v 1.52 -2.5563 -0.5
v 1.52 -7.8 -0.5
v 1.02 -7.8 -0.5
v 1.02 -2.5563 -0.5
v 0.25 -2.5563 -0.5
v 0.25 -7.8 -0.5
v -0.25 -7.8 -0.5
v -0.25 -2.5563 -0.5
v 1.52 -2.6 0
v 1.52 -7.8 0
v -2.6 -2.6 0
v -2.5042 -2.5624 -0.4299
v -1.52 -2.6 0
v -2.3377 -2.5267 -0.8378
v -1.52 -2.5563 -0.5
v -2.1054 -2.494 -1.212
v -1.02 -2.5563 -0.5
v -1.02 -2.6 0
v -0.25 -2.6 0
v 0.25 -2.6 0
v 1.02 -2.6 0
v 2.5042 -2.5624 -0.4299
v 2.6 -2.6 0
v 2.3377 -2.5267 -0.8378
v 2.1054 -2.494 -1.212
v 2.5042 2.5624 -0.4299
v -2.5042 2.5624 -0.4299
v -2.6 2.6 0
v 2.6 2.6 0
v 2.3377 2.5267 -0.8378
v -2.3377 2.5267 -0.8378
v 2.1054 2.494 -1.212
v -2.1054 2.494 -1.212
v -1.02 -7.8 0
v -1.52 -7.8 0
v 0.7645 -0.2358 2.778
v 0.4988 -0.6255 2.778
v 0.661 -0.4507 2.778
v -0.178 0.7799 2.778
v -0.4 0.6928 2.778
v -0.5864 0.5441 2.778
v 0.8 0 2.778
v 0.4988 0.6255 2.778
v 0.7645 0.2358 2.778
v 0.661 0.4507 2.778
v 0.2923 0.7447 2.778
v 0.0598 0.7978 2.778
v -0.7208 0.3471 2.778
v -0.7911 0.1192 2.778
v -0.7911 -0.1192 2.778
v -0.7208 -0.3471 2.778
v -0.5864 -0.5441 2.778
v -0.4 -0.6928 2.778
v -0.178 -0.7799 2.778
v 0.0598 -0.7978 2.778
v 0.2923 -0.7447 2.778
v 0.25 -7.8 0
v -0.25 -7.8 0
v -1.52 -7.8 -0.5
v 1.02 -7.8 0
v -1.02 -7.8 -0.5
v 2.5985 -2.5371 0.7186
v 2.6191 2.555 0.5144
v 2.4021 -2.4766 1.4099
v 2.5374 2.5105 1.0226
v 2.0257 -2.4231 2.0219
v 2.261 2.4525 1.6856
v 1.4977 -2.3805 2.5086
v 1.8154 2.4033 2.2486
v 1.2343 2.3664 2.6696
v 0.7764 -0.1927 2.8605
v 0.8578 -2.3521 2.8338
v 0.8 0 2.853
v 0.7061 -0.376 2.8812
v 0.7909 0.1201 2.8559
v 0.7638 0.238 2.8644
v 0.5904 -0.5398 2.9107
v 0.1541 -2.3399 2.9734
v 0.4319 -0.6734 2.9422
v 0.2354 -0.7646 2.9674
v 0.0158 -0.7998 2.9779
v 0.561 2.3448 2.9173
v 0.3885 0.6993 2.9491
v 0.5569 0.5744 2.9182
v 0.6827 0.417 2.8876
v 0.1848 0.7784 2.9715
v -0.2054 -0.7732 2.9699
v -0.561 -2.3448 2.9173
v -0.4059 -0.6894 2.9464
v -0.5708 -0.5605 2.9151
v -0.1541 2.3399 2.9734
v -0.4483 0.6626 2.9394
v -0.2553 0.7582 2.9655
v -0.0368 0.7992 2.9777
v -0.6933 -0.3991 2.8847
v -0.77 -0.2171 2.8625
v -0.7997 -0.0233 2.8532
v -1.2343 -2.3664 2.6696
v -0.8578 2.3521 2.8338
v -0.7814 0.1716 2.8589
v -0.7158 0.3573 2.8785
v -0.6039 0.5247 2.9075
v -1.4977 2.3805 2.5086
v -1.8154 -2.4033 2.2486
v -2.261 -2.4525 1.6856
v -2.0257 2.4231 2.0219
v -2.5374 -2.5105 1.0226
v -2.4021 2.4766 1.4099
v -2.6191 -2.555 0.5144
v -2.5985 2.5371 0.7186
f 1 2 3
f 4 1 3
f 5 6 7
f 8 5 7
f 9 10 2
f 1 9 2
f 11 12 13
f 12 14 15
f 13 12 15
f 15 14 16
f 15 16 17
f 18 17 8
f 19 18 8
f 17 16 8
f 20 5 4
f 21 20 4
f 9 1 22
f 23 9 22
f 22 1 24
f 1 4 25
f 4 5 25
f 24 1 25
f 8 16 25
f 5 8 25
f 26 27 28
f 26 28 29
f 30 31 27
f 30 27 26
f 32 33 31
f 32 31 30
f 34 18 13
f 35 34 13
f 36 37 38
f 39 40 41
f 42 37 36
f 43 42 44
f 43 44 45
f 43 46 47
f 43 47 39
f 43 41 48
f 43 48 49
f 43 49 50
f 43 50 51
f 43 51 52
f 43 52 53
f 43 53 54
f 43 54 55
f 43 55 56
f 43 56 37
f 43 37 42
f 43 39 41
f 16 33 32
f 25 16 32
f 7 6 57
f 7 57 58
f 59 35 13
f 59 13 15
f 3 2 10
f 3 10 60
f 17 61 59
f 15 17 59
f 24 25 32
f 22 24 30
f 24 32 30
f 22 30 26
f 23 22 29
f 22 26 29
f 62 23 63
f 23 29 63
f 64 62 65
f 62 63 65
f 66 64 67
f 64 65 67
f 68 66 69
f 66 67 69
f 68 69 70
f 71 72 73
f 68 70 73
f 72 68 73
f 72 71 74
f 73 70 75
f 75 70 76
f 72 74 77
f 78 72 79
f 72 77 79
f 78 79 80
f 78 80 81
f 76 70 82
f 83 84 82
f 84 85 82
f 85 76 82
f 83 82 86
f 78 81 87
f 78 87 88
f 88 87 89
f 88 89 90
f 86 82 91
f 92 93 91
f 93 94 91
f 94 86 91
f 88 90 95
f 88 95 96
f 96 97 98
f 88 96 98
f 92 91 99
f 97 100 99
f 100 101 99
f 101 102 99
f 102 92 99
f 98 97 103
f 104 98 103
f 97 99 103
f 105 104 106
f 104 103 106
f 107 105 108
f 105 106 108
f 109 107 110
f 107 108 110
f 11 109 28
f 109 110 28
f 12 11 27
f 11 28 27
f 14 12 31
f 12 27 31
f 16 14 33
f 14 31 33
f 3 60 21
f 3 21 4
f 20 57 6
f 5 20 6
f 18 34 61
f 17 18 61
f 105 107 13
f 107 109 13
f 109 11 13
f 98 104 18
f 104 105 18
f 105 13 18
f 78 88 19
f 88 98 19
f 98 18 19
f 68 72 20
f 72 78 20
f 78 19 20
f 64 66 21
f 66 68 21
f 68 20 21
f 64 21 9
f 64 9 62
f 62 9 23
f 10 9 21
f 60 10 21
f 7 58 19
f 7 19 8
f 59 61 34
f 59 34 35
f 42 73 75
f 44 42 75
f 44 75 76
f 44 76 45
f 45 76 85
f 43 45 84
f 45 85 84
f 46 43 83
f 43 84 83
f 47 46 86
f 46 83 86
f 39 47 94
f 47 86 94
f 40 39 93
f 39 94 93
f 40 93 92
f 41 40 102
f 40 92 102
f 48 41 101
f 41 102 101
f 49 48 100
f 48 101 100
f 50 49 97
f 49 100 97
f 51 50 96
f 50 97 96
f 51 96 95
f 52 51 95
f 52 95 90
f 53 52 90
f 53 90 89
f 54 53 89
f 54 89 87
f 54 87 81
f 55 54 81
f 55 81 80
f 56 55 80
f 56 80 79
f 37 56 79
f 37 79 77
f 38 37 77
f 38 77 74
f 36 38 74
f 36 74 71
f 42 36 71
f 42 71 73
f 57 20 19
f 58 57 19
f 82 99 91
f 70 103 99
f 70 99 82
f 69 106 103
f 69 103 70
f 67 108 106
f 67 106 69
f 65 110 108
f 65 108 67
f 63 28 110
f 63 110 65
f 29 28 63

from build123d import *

# Parameters (mm, degrees)
BOSS_EXTRUDE1_DEPTH             = 2.6
SKETCH5_W                       = 11.826356456
SKETCH5_H                       = 5.621169426
CUT_EXTRUDE2_DEPTH              = 7.632050589
SKETCH6_W                       = 11.690711404
SKETCH6_H                       = 7.254613366
CUT_EXTRUDE3_DEPTH              = 5.2
SKETCH7_W                       = 0.5
SKETCH7_H                       = 0.5
BOSS_EXTRUDE2_DEPTH             = 12.7
BOSS_EXTRUDE2_DIRECTION_2_REACH = 8.542
SKETCH8_R                       = 0.8
CUT_EXTRUDE4_DEPTH              = 0.2
SKETCH10_W                      = 6.769382977
SKETCH10_H                      = 8.778669798
CUT_EXTRUDE5_DEPTH              = 17.078911904


with BuildPart() as part:
    # Sketch2 → Boss-Extrude1 (new, symmetric)
    with BuildSketch(Plane(origin=(0, 0, 0), x_dir=(1, 0, 0), z_dir=(0, 1, 0))):
        with BuildLine():
            Line((-2.105447518, 1.212026432), (2.105447518, 1.212026432))
            ThreePointArc((2.105447518, 1.212026432), (0, -2.977973568), (-2.105447518, 1.212026432))
        make_face()
    extrude(amount=BOSS_EXTRUDE1_DEPTH, both=True)

    # Sketch5 → Cut-Extrude2 (cut, through all)
    with BuildSketch(Plane(origin=(0, 2.580250079, -0.225742631), x_dir=(1, 0, 0), z_dir=(0, 0.9961946980917455, -0.08715574274765836))):
        with Locations((0.924694538, -0.744658901)):
            Rectangle(SKETCH5_W, SKETCH5_H)
    cut_extrude2 = extrude(amount=CUT_EXTRUDE2_DEPTH, mode=Mode.SUBTRACT)

    # Sketch6 → Cut-Extrude3 (cut)
    with BuildSketch(Plane(origin=(0, 2.580250079, 0.225742631), x_dir=(1, 0, 0), z_dir=(0, 0.9961946980917467, 0.08715574274764504))):
        with Locations((0.257342704, -2.465539164)):
            Rectangle(SKETCH6_W, SKETCH6_H)
    cut_extrude3 = extrude(amount=CUT_EXTRUDE3_DEPTH, mode=Mode.SUBTRACT)

    # Mirror1: Cut-Extrude2, Cut-Extrude3 across plane
    add(cut_extrude2.mirror(Plane.ZX), mode=Mode.SUBTRACT)
    add(cut_extrude3.mirror(Plane.ZX), mode=Mode.SUBTRACT)

    # Sketch7 → Boss-Extrude2 (add)
    with BuildSketch(Plane(origin=(0, -2.6, 0), x_dir=(-1, 0, 0), z_dir=(0, -1, 0))):
        with Locations((-1.27, 0.25)):
            Rectangle(SKETCH7_W, SKETCH7_H)
        with Locations((0, 0.25)):
            Rectangle(SKETCH7_W, SKETCH7_H)
        with Locations((1.27, 0.25)):
            Rectangle(SKETCH7_W, SKETCH7_H)
    extrude(amount=BOSS_EXTRUDE2_DEPTH)

    # Sketch7 → Boss-Extrude2 direction 2 (add, up to next)
    with BuildSketch(Plane(origin=(0, -2.6, 0), x_dir=(-1, 0, 0), z_dir=(0, -1, 0)), mode=Mode.PRIVATE) as boss_extrude2_direction_2_sk1:
        with Locations((-1.27, 0.25)):
            Rectangle(SKETCH7_W, SKETCH7_H)
    boss_extrude2_direction_2_tool1 = extrude(boss_extrude2_direction_2_sk1.sketch, amount=-BOSS_EXTRUDE2_DIRECTION_2_REACH, mode=Mode.PRIVATE) - part.part
    # Sketch7 → Boss-Extrude2 direction 2 (add, up to next)
    with BuildSketch(Plane(origin=(0, -2.6, 0), x_dir=(-1, 0, 0), z_dir=(0, -1, 0)), mode=Mode.PRIVATE) as boss_extrude2_direction_2_sk2:
        with Locations((0, 0.25)):
            Rectangle(SKETCH7_W, SKETCH7_H)
    boss_extrude2_direction_2_tool2 = extrude(boss_extrude2_direction_2_sk2.sketch, amount=-BOSS_EXTRUDE2_DIRECTION_2_REACH, mode=Mode.PRIVATE) - part.part
    # Sketch7 → Boss-Extrude2 direction 2 (add, up to next)
    with BuildSketch(Plane(origin=(0, -2.6, 0), x_dir=(-1, 0, 0), z_dir=(0, -1, 0)), mode=Mode.PRIVATE) as boss_extrude2_direction_2_sk3:
        with Locations((1.27, 0.25)):
            Rectangle(SKETCH7_W, SKETCH7_H)
    boss_extrude2_direction_2_tool3 = extrude(boss_extrude2_direction_2_sk3.sketch, amount=-BOSS_EXTRUDE2_DIRECTION_2_REACH, mode=Mode.PRIVATE) - part.part
    add(boss_extrude2_direction_2_tool1.solids().sort_by_distance((1.27, -2.6, -0.25))[0])
    add(boss_extrude2_direction_2_tool2.solids().sort_by_distance((0, -2.6, -0.25))[0])
    add(boss_extrude2_direction_2_tool3.solids().sort_by_distance((-1.27, -2.6, -0.25))[0])

    # Sketch8 → Cut-Extrude4 (cut)
    with BuildSketch(Plane.XY.offset(2.977973568)):
        Circle(SKETCH8_R)
    extrude(amount=-CUT_EXTRUDE4_DEPTH, mode=Mode.SUBTRACT)

    # Sketch10 → Cut-Extrude5 (cut, through all)
    with BuildSketch(Plane(origin=(0, 0, -1.212026432), x_dir=(-1, 0, 0), z_dir=(0, 0, -1))):
        with Locations((0.550161867, -12.189334899)):
            Rectangle(SKETCH10_W, SKETCH10_H)
    extrude(amount=-CUT_EXTRUDE5_DEPTH, mode=Mode.SUBTRACT)


solid = part.part
